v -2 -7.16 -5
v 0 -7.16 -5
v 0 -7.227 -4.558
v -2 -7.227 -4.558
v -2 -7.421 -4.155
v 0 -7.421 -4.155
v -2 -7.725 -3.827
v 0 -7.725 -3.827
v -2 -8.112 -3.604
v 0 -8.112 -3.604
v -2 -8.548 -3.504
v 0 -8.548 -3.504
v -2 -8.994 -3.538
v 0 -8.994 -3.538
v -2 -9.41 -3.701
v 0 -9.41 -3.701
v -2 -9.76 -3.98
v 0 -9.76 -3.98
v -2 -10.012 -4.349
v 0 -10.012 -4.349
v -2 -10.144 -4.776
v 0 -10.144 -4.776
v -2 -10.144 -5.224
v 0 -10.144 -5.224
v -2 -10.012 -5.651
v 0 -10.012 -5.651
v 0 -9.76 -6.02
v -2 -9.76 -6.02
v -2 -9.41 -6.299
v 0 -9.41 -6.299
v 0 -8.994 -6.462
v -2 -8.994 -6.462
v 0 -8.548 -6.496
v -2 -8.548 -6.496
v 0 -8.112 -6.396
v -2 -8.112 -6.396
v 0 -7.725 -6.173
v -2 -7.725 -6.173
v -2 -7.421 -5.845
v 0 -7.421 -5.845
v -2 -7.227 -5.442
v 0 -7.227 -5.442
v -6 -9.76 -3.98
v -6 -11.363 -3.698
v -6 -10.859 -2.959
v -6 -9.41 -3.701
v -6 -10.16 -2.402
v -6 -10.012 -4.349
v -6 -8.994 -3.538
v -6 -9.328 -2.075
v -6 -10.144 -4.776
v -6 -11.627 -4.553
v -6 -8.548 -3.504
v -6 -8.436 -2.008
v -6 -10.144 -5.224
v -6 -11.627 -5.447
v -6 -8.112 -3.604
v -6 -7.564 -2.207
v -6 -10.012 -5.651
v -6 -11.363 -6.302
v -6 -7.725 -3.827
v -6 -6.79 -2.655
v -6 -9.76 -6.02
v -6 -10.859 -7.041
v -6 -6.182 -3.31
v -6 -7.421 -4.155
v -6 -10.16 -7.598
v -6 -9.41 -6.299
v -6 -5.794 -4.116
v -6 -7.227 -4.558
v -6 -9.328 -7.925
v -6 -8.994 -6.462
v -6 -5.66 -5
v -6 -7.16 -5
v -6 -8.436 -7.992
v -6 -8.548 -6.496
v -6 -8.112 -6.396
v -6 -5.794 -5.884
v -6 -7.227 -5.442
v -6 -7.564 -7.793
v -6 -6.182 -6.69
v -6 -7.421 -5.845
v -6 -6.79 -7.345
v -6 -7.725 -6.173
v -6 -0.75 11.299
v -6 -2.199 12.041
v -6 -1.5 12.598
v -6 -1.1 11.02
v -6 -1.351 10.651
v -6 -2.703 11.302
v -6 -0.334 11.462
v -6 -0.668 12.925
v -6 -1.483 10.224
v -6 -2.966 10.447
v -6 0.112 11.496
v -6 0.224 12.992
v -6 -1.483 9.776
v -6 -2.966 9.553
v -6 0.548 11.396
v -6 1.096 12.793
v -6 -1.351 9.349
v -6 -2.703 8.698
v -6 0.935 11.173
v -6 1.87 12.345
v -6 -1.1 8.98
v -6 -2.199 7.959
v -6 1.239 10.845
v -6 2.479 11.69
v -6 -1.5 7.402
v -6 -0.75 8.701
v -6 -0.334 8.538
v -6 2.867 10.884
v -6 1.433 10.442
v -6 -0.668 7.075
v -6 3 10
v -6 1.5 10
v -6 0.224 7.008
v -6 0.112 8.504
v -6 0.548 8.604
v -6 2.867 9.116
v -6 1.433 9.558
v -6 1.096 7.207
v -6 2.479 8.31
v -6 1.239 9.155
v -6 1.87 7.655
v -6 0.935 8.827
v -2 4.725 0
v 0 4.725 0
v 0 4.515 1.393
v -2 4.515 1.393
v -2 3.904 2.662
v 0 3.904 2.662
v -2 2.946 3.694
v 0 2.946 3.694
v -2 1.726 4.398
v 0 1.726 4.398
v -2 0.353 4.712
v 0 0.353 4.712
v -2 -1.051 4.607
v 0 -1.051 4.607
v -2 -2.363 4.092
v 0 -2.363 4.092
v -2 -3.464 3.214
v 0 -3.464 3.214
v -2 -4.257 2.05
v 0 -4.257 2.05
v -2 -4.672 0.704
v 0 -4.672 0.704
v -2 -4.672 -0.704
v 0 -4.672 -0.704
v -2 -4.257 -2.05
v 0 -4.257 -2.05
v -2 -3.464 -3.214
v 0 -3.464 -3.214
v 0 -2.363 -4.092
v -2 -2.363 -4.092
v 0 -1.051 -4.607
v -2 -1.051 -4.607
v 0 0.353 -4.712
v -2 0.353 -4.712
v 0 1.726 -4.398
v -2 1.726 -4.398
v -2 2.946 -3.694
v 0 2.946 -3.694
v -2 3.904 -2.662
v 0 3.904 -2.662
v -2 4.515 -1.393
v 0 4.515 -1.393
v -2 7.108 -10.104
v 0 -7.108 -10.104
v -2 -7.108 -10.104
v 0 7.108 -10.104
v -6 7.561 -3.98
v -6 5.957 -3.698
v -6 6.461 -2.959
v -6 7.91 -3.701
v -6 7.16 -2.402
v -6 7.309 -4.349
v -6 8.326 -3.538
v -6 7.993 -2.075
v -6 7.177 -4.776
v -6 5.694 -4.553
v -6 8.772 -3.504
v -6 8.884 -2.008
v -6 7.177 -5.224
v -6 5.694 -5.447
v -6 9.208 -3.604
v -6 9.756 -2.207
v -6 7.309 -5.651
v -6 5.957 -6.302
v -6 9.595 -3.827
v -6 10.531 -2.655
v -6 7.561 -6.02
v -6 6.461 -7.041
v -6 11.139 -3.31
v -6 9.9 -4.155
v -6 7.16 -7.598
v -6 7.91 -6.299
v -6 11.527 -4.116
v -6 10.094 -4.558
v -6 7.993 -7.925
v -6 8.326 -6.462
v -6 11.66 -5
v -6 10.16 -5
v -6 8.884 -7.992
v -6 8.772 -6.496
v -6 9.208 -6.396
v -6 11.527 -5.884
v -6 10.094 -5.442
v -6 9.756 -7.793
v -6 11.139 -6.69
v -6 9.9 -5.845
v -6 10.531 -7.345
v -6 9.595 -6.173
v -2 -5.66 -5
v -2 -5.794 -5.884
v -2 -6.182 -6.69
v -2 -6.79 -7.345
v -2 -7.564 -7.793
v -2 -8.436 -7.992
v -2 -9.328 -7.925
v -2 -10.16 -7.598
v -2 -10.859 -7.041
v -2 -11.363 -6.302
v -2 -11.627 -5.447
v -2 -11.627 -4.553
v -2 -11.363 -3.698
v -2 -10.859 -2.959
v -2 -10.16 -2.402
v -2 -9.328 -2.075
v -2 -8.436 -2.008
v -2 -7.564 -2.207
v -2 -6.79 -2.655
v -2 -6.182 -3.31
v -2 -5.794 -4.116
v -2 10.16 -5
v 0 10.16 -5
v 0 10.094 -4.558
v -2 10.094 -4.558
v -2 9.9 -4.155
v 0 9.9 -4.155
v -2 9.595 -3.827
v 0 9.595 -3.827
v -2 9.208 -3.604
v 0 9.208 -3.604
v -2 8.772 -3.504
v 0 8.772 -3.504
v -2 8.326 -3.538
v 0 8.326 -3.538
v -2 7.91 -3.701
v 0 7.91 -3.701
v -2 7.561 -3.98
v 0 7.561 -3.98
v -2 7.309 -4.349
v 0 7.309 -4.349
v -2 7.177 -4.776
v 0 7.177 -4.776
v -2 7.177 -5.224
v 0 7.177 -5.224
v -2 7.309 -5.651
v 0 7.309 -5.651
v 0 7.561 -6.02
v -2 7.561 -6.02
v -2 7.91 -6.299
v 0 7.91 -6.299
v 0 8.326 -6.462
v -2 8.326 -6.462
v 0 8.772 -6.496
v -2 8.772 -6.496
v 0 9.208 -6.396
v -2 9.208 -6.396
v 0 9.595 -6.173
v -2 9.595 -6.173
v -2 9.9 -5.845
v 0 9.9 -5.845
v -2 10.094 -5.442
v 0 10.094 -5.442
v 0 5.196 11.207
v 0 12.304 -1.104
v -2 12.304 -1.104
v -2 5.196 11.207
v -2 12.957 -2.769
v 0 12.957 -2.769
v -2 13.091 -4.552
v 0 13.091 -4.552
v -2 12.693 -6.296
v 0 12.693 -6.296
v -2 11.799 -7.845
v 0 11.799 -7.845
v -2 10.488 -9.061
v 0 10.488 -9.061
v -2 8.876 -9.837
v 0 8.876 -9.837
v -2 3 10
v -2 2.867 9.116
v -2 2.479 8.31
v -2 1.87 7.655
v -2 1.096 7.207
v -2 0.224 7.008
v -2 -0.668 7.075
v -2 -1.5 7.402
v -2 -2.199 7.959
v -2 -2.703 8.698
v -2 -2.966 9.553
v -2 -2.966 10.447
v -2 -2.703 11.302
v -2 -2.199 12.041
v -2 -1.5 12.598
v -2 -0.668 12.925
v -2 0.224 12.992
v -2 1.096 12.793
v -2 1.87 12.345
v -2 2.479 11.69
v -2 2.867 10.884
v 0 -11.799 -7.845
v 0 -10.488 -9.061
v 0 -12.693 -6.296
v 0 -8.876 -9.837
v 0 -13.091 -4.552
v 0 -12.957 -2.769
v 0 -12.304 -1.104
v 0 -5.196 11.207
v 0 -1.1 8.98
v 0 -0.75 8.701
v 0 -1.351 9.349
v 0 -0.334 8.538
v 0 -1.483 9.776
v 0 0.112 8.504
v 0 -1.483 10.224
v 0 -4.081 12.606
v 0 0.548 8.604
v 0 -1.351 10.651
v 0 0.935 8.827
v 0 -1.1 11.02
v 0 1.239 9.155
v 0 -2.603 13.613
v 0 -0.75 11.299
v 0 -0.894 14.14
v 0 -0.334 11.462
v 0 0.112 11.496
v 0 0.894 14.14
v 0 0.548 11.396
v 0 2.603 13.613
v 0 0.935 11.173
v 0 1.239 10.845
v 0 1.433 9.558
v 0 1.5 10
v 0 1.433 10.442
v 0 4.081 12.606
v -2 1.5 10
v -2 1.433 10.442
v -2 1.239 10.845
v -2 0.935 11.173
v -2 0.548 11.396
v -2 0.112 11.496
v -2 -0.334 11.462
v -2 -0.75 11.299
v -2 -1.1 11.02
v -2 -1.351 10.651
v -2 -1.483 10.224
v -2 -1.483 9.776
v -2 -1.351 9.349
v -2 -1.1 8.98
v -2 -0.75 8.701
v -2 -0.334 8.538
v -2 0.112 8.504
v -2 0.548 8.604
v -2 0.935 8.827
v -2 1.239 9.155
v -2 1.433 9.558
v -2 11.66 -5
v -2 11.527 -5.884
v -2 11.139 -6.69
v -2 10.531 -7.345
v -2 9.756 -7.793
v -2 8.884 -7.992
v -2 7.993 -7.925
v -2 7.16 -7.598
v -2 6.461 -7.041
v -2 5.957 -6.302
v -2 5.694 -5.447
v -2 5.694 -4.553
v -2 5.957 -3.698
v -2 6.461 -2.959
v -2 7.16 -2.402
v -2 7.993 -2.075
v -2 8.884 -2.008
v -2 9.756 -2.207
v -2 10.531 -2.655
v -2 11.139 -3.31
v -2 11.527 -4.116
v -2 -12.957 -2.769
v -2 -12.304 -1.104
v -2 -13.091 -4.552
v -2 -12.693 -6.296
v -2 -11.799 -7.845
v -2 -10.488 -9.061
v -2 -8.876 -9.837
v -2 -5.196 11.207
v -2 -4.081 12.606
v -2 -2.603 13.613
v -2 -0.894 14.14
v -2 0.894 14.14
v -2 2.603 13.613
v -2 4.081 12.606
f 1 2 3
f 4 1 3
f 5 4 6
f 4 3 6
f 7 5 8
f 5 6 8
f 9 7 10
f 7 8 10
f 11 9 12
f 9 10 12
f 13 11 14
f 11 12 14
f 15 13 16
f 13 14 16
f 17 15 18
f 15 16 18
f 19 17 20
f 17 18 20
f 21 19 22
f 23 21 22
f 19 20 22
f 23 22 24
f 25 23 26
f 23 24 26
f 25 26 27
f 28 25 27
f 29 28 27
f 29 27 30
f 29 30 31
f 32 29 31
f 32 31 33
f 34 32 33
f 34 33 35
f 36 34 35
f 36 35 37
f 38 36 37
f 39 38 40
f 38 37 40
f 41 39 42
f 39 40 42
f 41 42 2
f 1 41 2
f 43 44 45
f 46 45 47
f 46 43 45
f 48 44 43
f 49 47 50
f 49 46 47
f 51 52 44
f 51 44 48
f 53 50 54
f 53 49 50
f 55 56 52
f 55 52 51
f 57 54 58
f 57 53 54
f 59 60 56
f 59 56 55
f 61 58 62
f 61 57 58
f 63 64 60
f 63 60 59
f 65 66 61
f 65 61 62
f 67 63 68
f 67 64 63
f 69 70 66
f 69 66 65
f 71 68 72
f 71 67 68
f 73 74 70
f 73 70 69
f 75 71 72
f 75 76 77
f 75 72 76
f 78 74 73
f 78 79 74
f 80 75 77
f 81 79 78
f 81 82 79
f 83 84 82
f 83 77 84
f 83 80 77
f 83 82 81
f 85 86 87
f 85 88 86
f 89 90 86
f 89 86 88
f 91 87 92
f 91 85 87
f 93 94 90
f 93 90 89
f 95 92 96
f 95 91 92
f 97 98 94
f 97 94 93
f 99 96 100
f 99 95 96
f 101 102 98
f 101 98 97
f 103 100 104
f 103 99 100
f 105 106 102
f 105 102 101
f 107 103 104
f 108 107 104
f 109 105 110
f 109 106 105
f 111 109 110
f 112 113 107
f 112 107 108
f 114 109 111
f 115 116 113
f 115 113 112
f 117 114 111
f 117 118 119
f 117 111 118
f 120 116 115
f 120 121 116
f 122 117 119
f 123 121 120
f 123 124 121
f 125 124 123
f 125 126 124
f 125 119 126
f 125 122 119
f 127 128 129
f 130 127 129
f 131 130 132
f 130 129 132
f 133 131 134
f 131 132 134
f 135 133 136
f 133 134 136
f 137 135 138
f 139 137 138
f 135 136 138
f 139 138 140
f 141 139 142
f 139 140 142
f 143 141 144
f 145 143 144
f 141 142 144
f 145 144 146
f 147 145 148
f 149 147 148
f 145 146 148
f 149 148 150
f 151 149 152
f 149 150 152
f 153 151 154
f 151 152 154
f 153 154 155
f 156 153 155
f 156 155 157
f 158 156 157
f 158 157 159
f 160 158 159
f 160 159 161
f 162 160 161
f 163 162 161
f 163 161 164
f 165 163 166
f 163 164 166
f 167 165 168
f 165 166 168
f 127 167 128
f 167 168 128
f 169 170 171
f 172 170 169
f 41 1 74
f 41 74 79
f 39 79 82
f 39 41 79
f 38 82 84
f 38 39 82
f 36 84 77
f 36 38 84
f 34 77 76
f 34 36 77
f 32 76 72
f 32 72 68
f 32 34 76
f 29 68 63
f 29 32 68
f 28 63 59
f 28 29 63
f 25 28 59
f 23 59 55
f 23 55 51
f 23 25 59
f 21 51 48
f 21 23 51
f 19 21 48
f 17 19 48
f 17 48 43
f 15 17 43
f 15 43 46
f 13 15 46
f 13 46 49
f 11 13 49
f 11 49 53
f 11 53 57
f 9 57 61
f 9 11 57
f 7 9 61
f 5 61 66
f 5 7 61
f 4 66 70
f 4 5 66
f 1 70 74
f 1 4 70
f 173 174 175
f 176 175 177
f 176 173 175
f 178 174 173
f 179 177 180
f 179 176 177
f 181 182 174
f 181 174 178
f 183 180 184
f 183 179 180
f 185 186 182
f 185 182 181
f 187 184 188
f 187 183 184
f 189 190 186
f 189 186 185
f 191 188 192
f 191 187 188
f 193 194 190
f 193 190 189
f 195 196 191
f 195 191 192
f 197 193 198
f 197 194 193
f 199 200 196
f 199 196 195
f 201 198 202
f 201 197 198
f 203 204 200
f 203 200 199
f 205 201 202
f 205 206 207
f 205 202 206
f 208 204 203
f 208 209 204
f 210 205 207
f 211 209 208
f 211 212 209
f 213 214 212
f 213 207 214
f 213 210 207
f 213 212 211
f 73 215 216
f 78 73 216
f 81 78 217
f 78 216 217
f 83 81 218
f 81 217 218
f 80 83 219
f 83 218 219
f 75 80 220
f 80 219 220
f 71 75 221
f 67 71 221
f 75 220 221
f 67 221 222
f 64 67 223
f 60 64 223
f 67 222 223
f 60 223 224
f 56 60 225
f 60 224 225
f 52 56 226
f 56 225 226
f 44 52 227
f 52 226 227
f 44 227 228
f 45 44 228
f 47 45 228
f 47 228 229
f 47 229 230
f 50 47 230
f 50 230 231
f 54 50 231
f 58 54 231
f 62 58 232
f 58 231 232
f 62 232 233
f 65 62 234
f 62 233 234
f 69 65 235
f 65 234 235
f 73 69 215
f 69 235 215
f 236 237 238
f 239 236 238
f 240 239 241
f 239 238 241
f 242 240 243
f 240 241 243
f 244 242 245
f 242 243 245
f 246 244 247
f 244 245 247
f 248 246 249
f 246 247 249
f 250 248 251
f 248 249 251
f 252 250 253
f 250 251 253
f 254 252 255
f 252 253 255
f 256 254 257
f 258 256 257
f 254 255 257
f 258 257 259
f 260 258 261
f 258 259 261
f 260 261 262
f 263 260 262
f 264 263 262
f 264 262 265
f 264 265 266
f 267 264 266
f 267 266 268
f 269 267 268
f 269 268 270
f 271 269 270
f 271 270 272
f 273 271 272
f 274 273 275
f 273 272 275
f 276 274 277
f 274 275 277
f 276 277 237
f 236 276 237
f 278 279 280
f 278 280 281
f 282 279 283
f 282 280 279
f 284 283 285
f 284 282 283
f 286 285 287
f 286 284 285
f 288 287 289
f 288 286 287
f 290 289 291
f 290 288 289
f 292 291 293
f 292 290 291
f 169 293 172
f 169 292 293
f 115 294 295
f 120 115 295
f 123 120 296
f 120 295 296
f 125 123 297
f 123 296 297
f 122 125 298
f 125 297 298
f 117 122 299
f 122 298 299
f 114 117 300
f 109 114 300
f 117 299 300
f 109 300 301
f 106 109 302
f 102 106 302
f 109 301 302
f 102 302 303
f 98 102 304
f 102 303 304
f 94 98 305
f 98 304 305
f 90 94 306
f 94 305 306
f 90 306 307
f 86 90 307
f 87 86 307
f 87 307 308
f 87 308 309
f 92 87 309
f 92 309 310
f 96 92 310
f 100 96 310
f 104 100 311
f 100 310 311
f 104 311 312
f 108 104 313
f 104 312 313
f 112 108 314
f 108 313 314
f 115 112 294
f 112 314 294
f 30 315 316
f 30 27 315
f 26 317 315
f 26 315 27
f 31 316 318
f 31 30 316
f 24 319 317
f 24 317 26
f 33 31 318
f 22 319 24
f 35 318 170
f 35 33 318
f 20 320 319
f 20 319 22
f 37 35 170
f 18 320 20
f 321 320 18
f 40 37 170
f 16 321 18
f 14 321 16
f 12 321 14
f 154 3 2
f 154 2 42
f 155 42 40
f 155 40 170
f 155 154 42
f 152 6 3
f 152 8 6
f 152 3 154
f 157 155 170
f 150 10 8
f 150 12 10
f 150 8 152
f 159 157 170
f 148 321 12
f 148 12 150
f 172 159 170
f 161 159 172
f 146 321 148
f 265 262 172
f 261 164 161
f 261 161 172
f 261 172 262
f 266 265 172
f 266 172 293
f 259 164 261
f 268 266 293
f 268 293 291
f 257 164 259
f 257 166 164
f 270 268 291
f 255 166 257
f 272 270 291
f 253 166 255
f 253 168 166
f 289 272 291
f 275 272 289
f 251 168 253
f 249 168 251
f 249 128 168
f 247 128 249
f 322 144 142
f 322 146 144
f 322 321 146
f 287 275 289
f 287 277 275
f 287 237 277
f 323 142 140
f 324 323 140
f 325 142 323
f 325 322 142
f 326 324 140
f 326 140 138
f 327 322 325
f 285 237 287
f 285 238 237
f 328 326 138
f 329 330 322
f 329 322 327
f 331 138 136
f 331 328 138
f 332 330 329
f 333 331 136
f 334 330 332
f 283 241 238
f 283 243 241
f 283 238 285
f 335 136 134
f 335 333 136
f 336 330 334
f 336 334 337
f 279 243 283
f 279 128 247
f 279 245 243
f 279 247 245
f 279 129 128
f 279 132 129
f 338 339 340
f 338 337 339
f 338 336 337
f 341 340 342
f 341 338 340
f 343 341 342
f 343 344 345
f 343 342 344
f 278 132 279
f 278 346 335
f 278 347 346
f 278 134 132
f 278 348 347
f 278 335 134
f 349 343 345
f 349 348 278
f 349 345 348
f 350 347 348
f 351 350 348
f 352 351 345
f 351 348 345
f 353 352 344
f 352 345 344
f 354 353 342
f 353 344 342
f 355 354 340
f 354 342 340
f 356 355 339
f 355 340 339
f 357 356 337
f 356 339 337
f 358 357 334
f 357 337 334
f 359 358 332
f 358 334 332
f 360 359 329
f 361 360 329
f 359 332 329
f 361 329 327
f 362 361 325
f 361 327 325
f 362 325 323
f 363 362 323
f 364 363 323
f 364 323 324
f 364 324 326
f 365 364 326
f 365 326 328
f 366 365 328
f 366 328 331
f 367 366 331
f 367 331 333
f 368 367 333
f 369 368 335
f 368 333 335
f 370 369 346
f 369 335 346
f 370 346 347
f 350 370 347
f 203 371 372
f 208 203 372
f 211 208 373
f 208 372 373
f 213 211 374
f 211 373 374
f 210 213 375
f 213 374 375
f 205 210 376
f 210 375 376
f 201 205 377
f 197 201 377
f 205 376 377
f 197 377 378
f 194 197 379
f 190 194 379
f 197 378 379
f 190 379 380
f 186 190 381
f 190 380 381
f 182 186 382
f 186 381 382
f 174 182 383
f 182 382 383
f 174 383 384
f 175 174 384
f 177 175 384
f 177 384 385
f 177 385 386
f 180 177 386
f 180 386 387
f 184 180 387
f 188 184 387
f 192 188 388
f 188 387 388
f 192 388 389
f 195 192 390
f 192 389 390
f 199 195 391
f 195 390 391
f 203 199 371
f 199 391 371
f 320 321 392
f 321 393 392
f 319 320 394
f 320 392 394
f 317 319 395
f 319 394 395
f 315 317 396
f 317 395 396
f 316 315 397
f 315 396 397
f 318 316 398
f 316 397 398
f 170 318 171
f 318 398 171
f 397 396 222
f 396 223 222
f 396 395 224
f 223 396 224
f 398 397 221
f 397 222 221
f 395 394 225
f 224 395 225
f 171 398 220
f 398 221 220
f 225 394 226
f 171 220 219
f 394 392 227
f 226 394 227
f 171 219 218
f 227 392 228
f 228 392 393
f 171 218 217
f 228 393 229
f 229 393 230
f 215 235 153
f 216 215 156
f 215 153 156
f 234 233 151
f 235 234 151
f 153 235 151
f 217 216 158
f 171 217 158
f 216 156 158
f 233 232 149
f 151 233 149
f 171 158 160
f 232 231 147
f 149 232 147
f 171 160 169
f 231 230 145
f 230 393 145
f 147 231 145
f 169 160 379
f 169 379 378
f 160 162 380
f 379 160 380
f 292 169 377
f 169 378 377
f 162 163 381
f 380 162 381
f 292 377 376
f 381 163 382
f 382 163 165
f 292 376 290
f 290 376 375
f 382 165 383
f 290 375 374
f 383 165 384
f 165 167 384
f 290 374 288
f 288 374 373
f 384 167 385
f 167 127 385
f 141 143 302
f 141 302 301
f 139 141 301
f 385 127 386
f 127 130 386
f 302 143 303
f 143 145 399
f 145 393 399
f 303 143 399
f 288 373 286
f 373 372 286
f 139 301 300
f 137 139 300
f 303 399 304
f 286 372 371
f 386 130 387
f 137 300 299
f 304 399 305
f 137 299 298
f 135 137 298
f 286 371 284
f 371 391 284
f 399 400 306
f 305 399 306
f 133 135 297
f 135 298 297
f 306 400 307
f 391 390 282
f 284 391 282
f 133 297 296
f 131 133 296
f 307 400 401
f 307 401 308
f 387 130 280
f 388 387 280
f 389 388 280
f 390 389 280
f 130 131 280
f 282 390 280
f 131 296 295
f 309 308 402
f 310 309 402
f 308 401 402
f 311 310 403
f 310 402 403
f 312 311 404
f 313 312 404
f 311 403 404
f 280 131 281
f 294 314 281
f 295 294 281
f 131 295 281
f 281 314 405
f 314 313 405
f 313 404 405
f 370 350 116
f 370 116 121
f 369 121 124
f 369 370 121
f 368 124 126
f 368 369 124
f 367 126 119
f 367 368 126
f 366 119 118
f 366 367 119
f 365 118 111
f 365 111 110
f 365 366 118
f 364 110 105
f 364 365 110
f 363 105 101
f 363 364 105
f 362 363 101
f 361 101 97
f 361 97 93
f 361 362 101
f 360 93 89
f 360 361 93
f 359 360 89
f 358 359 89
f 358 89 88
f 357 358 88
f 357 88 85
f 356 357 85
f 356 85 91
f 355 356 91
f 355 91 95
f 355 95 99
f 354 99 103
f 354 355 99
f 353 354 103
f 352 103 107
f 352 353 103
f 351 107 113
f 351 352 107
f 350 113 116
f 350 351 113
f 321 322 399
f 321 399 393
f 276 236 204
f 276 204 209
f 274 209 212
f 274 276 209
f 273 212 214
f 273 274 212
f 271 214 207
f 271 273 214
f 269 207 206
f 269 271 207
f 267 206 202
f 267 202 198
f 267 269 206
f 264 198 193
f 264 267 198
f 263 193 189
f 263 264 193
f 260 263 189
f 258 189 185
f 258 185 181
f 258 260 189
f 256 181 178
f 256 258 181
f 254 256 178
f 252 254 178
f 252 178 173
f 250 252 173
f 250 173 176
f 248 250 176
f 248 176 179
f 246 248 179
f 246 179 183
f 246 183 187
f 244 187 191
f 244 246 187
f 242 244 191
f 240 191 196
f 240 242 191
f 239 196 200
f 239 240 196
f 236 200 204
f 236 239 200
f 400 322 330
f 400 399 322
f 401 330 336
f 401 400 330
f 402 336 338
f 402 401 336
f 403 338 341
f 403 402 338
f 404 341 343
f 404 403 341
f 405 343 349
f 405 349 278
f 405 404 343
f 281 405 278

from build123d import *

# Parameters (mm, degrees)
SKETCH_R      = 4.725
SKETCH_R_2    = 1.5
PAD_DEPTH     = 2
SKETCH001_R   = 3
SKETCH001_R_2 = 1.5
PAD001_DEPTH  = 4
FILLET_R      = 6


with BuildPart() as part:
    # Sketch → Pad (new body)
    with BuildSketch(Plane.YZ):
        Polygon((0, 20.207259), (-17.5, -10.10363), (17.5, -10.10363), align=None)
        Circle(SKETCH_R, mode=Mode.SUBTRACT)
        with Locations((0, 10)):
            Circle(SKETCH_R_2, mode=Mode.SUBTRACT)
        with Locations((-8.660254, -5)):
            Circle(SKETCH_R_2, mode=Mode.SUBTRACT)
        with Locations((8.660254, -5)):
            Circle(SKETCH_R_2, mode=Mode.SUBTRACT)
    extrude(amount=-PAD_DEPTH)

    # Sketch001 (on Face9 of Pad) → Pad001 (join)
    with BuildSketch(Plane(origin=(-2, 0, 0), x_dir=(0, 1, 0), z_dir=(-1, 0, 0))):
        with Locations((8.660254, 5)):
            Circle(SKETCH001_R)
        with Locations((8.660254, 5)):
            Circle(SKETCH001_R_2, mode=Mode.SUBTRACT)
        with Locations((-8.660254, 5)):
            Circle(SKETCH001_R)
        with Locations((-8.660254, 5)):
            Circle(SKETCH001_R_2, mode=Mode.SUBTRACT)
        with Locations((0, -10)):
            Circle(SKETCH001_R)
        with Locations((0, -10)):
            Circle(SKETCH001_R_2, mode=Mode.SUBTRACT)
    extrude(amount=PAD001_DEPTH)

    # Fillet
    fillet_edges = [part.edges().sort_by_distance(p)[0] for p in [
        (-1, 0, 20.207259),
        (-1, -17.5, -10.10363),
        (-1, 17.5, -10.10363),
    ]]
    fillet(fillet_edges, radius=FILLET_R)


solid = part.part
